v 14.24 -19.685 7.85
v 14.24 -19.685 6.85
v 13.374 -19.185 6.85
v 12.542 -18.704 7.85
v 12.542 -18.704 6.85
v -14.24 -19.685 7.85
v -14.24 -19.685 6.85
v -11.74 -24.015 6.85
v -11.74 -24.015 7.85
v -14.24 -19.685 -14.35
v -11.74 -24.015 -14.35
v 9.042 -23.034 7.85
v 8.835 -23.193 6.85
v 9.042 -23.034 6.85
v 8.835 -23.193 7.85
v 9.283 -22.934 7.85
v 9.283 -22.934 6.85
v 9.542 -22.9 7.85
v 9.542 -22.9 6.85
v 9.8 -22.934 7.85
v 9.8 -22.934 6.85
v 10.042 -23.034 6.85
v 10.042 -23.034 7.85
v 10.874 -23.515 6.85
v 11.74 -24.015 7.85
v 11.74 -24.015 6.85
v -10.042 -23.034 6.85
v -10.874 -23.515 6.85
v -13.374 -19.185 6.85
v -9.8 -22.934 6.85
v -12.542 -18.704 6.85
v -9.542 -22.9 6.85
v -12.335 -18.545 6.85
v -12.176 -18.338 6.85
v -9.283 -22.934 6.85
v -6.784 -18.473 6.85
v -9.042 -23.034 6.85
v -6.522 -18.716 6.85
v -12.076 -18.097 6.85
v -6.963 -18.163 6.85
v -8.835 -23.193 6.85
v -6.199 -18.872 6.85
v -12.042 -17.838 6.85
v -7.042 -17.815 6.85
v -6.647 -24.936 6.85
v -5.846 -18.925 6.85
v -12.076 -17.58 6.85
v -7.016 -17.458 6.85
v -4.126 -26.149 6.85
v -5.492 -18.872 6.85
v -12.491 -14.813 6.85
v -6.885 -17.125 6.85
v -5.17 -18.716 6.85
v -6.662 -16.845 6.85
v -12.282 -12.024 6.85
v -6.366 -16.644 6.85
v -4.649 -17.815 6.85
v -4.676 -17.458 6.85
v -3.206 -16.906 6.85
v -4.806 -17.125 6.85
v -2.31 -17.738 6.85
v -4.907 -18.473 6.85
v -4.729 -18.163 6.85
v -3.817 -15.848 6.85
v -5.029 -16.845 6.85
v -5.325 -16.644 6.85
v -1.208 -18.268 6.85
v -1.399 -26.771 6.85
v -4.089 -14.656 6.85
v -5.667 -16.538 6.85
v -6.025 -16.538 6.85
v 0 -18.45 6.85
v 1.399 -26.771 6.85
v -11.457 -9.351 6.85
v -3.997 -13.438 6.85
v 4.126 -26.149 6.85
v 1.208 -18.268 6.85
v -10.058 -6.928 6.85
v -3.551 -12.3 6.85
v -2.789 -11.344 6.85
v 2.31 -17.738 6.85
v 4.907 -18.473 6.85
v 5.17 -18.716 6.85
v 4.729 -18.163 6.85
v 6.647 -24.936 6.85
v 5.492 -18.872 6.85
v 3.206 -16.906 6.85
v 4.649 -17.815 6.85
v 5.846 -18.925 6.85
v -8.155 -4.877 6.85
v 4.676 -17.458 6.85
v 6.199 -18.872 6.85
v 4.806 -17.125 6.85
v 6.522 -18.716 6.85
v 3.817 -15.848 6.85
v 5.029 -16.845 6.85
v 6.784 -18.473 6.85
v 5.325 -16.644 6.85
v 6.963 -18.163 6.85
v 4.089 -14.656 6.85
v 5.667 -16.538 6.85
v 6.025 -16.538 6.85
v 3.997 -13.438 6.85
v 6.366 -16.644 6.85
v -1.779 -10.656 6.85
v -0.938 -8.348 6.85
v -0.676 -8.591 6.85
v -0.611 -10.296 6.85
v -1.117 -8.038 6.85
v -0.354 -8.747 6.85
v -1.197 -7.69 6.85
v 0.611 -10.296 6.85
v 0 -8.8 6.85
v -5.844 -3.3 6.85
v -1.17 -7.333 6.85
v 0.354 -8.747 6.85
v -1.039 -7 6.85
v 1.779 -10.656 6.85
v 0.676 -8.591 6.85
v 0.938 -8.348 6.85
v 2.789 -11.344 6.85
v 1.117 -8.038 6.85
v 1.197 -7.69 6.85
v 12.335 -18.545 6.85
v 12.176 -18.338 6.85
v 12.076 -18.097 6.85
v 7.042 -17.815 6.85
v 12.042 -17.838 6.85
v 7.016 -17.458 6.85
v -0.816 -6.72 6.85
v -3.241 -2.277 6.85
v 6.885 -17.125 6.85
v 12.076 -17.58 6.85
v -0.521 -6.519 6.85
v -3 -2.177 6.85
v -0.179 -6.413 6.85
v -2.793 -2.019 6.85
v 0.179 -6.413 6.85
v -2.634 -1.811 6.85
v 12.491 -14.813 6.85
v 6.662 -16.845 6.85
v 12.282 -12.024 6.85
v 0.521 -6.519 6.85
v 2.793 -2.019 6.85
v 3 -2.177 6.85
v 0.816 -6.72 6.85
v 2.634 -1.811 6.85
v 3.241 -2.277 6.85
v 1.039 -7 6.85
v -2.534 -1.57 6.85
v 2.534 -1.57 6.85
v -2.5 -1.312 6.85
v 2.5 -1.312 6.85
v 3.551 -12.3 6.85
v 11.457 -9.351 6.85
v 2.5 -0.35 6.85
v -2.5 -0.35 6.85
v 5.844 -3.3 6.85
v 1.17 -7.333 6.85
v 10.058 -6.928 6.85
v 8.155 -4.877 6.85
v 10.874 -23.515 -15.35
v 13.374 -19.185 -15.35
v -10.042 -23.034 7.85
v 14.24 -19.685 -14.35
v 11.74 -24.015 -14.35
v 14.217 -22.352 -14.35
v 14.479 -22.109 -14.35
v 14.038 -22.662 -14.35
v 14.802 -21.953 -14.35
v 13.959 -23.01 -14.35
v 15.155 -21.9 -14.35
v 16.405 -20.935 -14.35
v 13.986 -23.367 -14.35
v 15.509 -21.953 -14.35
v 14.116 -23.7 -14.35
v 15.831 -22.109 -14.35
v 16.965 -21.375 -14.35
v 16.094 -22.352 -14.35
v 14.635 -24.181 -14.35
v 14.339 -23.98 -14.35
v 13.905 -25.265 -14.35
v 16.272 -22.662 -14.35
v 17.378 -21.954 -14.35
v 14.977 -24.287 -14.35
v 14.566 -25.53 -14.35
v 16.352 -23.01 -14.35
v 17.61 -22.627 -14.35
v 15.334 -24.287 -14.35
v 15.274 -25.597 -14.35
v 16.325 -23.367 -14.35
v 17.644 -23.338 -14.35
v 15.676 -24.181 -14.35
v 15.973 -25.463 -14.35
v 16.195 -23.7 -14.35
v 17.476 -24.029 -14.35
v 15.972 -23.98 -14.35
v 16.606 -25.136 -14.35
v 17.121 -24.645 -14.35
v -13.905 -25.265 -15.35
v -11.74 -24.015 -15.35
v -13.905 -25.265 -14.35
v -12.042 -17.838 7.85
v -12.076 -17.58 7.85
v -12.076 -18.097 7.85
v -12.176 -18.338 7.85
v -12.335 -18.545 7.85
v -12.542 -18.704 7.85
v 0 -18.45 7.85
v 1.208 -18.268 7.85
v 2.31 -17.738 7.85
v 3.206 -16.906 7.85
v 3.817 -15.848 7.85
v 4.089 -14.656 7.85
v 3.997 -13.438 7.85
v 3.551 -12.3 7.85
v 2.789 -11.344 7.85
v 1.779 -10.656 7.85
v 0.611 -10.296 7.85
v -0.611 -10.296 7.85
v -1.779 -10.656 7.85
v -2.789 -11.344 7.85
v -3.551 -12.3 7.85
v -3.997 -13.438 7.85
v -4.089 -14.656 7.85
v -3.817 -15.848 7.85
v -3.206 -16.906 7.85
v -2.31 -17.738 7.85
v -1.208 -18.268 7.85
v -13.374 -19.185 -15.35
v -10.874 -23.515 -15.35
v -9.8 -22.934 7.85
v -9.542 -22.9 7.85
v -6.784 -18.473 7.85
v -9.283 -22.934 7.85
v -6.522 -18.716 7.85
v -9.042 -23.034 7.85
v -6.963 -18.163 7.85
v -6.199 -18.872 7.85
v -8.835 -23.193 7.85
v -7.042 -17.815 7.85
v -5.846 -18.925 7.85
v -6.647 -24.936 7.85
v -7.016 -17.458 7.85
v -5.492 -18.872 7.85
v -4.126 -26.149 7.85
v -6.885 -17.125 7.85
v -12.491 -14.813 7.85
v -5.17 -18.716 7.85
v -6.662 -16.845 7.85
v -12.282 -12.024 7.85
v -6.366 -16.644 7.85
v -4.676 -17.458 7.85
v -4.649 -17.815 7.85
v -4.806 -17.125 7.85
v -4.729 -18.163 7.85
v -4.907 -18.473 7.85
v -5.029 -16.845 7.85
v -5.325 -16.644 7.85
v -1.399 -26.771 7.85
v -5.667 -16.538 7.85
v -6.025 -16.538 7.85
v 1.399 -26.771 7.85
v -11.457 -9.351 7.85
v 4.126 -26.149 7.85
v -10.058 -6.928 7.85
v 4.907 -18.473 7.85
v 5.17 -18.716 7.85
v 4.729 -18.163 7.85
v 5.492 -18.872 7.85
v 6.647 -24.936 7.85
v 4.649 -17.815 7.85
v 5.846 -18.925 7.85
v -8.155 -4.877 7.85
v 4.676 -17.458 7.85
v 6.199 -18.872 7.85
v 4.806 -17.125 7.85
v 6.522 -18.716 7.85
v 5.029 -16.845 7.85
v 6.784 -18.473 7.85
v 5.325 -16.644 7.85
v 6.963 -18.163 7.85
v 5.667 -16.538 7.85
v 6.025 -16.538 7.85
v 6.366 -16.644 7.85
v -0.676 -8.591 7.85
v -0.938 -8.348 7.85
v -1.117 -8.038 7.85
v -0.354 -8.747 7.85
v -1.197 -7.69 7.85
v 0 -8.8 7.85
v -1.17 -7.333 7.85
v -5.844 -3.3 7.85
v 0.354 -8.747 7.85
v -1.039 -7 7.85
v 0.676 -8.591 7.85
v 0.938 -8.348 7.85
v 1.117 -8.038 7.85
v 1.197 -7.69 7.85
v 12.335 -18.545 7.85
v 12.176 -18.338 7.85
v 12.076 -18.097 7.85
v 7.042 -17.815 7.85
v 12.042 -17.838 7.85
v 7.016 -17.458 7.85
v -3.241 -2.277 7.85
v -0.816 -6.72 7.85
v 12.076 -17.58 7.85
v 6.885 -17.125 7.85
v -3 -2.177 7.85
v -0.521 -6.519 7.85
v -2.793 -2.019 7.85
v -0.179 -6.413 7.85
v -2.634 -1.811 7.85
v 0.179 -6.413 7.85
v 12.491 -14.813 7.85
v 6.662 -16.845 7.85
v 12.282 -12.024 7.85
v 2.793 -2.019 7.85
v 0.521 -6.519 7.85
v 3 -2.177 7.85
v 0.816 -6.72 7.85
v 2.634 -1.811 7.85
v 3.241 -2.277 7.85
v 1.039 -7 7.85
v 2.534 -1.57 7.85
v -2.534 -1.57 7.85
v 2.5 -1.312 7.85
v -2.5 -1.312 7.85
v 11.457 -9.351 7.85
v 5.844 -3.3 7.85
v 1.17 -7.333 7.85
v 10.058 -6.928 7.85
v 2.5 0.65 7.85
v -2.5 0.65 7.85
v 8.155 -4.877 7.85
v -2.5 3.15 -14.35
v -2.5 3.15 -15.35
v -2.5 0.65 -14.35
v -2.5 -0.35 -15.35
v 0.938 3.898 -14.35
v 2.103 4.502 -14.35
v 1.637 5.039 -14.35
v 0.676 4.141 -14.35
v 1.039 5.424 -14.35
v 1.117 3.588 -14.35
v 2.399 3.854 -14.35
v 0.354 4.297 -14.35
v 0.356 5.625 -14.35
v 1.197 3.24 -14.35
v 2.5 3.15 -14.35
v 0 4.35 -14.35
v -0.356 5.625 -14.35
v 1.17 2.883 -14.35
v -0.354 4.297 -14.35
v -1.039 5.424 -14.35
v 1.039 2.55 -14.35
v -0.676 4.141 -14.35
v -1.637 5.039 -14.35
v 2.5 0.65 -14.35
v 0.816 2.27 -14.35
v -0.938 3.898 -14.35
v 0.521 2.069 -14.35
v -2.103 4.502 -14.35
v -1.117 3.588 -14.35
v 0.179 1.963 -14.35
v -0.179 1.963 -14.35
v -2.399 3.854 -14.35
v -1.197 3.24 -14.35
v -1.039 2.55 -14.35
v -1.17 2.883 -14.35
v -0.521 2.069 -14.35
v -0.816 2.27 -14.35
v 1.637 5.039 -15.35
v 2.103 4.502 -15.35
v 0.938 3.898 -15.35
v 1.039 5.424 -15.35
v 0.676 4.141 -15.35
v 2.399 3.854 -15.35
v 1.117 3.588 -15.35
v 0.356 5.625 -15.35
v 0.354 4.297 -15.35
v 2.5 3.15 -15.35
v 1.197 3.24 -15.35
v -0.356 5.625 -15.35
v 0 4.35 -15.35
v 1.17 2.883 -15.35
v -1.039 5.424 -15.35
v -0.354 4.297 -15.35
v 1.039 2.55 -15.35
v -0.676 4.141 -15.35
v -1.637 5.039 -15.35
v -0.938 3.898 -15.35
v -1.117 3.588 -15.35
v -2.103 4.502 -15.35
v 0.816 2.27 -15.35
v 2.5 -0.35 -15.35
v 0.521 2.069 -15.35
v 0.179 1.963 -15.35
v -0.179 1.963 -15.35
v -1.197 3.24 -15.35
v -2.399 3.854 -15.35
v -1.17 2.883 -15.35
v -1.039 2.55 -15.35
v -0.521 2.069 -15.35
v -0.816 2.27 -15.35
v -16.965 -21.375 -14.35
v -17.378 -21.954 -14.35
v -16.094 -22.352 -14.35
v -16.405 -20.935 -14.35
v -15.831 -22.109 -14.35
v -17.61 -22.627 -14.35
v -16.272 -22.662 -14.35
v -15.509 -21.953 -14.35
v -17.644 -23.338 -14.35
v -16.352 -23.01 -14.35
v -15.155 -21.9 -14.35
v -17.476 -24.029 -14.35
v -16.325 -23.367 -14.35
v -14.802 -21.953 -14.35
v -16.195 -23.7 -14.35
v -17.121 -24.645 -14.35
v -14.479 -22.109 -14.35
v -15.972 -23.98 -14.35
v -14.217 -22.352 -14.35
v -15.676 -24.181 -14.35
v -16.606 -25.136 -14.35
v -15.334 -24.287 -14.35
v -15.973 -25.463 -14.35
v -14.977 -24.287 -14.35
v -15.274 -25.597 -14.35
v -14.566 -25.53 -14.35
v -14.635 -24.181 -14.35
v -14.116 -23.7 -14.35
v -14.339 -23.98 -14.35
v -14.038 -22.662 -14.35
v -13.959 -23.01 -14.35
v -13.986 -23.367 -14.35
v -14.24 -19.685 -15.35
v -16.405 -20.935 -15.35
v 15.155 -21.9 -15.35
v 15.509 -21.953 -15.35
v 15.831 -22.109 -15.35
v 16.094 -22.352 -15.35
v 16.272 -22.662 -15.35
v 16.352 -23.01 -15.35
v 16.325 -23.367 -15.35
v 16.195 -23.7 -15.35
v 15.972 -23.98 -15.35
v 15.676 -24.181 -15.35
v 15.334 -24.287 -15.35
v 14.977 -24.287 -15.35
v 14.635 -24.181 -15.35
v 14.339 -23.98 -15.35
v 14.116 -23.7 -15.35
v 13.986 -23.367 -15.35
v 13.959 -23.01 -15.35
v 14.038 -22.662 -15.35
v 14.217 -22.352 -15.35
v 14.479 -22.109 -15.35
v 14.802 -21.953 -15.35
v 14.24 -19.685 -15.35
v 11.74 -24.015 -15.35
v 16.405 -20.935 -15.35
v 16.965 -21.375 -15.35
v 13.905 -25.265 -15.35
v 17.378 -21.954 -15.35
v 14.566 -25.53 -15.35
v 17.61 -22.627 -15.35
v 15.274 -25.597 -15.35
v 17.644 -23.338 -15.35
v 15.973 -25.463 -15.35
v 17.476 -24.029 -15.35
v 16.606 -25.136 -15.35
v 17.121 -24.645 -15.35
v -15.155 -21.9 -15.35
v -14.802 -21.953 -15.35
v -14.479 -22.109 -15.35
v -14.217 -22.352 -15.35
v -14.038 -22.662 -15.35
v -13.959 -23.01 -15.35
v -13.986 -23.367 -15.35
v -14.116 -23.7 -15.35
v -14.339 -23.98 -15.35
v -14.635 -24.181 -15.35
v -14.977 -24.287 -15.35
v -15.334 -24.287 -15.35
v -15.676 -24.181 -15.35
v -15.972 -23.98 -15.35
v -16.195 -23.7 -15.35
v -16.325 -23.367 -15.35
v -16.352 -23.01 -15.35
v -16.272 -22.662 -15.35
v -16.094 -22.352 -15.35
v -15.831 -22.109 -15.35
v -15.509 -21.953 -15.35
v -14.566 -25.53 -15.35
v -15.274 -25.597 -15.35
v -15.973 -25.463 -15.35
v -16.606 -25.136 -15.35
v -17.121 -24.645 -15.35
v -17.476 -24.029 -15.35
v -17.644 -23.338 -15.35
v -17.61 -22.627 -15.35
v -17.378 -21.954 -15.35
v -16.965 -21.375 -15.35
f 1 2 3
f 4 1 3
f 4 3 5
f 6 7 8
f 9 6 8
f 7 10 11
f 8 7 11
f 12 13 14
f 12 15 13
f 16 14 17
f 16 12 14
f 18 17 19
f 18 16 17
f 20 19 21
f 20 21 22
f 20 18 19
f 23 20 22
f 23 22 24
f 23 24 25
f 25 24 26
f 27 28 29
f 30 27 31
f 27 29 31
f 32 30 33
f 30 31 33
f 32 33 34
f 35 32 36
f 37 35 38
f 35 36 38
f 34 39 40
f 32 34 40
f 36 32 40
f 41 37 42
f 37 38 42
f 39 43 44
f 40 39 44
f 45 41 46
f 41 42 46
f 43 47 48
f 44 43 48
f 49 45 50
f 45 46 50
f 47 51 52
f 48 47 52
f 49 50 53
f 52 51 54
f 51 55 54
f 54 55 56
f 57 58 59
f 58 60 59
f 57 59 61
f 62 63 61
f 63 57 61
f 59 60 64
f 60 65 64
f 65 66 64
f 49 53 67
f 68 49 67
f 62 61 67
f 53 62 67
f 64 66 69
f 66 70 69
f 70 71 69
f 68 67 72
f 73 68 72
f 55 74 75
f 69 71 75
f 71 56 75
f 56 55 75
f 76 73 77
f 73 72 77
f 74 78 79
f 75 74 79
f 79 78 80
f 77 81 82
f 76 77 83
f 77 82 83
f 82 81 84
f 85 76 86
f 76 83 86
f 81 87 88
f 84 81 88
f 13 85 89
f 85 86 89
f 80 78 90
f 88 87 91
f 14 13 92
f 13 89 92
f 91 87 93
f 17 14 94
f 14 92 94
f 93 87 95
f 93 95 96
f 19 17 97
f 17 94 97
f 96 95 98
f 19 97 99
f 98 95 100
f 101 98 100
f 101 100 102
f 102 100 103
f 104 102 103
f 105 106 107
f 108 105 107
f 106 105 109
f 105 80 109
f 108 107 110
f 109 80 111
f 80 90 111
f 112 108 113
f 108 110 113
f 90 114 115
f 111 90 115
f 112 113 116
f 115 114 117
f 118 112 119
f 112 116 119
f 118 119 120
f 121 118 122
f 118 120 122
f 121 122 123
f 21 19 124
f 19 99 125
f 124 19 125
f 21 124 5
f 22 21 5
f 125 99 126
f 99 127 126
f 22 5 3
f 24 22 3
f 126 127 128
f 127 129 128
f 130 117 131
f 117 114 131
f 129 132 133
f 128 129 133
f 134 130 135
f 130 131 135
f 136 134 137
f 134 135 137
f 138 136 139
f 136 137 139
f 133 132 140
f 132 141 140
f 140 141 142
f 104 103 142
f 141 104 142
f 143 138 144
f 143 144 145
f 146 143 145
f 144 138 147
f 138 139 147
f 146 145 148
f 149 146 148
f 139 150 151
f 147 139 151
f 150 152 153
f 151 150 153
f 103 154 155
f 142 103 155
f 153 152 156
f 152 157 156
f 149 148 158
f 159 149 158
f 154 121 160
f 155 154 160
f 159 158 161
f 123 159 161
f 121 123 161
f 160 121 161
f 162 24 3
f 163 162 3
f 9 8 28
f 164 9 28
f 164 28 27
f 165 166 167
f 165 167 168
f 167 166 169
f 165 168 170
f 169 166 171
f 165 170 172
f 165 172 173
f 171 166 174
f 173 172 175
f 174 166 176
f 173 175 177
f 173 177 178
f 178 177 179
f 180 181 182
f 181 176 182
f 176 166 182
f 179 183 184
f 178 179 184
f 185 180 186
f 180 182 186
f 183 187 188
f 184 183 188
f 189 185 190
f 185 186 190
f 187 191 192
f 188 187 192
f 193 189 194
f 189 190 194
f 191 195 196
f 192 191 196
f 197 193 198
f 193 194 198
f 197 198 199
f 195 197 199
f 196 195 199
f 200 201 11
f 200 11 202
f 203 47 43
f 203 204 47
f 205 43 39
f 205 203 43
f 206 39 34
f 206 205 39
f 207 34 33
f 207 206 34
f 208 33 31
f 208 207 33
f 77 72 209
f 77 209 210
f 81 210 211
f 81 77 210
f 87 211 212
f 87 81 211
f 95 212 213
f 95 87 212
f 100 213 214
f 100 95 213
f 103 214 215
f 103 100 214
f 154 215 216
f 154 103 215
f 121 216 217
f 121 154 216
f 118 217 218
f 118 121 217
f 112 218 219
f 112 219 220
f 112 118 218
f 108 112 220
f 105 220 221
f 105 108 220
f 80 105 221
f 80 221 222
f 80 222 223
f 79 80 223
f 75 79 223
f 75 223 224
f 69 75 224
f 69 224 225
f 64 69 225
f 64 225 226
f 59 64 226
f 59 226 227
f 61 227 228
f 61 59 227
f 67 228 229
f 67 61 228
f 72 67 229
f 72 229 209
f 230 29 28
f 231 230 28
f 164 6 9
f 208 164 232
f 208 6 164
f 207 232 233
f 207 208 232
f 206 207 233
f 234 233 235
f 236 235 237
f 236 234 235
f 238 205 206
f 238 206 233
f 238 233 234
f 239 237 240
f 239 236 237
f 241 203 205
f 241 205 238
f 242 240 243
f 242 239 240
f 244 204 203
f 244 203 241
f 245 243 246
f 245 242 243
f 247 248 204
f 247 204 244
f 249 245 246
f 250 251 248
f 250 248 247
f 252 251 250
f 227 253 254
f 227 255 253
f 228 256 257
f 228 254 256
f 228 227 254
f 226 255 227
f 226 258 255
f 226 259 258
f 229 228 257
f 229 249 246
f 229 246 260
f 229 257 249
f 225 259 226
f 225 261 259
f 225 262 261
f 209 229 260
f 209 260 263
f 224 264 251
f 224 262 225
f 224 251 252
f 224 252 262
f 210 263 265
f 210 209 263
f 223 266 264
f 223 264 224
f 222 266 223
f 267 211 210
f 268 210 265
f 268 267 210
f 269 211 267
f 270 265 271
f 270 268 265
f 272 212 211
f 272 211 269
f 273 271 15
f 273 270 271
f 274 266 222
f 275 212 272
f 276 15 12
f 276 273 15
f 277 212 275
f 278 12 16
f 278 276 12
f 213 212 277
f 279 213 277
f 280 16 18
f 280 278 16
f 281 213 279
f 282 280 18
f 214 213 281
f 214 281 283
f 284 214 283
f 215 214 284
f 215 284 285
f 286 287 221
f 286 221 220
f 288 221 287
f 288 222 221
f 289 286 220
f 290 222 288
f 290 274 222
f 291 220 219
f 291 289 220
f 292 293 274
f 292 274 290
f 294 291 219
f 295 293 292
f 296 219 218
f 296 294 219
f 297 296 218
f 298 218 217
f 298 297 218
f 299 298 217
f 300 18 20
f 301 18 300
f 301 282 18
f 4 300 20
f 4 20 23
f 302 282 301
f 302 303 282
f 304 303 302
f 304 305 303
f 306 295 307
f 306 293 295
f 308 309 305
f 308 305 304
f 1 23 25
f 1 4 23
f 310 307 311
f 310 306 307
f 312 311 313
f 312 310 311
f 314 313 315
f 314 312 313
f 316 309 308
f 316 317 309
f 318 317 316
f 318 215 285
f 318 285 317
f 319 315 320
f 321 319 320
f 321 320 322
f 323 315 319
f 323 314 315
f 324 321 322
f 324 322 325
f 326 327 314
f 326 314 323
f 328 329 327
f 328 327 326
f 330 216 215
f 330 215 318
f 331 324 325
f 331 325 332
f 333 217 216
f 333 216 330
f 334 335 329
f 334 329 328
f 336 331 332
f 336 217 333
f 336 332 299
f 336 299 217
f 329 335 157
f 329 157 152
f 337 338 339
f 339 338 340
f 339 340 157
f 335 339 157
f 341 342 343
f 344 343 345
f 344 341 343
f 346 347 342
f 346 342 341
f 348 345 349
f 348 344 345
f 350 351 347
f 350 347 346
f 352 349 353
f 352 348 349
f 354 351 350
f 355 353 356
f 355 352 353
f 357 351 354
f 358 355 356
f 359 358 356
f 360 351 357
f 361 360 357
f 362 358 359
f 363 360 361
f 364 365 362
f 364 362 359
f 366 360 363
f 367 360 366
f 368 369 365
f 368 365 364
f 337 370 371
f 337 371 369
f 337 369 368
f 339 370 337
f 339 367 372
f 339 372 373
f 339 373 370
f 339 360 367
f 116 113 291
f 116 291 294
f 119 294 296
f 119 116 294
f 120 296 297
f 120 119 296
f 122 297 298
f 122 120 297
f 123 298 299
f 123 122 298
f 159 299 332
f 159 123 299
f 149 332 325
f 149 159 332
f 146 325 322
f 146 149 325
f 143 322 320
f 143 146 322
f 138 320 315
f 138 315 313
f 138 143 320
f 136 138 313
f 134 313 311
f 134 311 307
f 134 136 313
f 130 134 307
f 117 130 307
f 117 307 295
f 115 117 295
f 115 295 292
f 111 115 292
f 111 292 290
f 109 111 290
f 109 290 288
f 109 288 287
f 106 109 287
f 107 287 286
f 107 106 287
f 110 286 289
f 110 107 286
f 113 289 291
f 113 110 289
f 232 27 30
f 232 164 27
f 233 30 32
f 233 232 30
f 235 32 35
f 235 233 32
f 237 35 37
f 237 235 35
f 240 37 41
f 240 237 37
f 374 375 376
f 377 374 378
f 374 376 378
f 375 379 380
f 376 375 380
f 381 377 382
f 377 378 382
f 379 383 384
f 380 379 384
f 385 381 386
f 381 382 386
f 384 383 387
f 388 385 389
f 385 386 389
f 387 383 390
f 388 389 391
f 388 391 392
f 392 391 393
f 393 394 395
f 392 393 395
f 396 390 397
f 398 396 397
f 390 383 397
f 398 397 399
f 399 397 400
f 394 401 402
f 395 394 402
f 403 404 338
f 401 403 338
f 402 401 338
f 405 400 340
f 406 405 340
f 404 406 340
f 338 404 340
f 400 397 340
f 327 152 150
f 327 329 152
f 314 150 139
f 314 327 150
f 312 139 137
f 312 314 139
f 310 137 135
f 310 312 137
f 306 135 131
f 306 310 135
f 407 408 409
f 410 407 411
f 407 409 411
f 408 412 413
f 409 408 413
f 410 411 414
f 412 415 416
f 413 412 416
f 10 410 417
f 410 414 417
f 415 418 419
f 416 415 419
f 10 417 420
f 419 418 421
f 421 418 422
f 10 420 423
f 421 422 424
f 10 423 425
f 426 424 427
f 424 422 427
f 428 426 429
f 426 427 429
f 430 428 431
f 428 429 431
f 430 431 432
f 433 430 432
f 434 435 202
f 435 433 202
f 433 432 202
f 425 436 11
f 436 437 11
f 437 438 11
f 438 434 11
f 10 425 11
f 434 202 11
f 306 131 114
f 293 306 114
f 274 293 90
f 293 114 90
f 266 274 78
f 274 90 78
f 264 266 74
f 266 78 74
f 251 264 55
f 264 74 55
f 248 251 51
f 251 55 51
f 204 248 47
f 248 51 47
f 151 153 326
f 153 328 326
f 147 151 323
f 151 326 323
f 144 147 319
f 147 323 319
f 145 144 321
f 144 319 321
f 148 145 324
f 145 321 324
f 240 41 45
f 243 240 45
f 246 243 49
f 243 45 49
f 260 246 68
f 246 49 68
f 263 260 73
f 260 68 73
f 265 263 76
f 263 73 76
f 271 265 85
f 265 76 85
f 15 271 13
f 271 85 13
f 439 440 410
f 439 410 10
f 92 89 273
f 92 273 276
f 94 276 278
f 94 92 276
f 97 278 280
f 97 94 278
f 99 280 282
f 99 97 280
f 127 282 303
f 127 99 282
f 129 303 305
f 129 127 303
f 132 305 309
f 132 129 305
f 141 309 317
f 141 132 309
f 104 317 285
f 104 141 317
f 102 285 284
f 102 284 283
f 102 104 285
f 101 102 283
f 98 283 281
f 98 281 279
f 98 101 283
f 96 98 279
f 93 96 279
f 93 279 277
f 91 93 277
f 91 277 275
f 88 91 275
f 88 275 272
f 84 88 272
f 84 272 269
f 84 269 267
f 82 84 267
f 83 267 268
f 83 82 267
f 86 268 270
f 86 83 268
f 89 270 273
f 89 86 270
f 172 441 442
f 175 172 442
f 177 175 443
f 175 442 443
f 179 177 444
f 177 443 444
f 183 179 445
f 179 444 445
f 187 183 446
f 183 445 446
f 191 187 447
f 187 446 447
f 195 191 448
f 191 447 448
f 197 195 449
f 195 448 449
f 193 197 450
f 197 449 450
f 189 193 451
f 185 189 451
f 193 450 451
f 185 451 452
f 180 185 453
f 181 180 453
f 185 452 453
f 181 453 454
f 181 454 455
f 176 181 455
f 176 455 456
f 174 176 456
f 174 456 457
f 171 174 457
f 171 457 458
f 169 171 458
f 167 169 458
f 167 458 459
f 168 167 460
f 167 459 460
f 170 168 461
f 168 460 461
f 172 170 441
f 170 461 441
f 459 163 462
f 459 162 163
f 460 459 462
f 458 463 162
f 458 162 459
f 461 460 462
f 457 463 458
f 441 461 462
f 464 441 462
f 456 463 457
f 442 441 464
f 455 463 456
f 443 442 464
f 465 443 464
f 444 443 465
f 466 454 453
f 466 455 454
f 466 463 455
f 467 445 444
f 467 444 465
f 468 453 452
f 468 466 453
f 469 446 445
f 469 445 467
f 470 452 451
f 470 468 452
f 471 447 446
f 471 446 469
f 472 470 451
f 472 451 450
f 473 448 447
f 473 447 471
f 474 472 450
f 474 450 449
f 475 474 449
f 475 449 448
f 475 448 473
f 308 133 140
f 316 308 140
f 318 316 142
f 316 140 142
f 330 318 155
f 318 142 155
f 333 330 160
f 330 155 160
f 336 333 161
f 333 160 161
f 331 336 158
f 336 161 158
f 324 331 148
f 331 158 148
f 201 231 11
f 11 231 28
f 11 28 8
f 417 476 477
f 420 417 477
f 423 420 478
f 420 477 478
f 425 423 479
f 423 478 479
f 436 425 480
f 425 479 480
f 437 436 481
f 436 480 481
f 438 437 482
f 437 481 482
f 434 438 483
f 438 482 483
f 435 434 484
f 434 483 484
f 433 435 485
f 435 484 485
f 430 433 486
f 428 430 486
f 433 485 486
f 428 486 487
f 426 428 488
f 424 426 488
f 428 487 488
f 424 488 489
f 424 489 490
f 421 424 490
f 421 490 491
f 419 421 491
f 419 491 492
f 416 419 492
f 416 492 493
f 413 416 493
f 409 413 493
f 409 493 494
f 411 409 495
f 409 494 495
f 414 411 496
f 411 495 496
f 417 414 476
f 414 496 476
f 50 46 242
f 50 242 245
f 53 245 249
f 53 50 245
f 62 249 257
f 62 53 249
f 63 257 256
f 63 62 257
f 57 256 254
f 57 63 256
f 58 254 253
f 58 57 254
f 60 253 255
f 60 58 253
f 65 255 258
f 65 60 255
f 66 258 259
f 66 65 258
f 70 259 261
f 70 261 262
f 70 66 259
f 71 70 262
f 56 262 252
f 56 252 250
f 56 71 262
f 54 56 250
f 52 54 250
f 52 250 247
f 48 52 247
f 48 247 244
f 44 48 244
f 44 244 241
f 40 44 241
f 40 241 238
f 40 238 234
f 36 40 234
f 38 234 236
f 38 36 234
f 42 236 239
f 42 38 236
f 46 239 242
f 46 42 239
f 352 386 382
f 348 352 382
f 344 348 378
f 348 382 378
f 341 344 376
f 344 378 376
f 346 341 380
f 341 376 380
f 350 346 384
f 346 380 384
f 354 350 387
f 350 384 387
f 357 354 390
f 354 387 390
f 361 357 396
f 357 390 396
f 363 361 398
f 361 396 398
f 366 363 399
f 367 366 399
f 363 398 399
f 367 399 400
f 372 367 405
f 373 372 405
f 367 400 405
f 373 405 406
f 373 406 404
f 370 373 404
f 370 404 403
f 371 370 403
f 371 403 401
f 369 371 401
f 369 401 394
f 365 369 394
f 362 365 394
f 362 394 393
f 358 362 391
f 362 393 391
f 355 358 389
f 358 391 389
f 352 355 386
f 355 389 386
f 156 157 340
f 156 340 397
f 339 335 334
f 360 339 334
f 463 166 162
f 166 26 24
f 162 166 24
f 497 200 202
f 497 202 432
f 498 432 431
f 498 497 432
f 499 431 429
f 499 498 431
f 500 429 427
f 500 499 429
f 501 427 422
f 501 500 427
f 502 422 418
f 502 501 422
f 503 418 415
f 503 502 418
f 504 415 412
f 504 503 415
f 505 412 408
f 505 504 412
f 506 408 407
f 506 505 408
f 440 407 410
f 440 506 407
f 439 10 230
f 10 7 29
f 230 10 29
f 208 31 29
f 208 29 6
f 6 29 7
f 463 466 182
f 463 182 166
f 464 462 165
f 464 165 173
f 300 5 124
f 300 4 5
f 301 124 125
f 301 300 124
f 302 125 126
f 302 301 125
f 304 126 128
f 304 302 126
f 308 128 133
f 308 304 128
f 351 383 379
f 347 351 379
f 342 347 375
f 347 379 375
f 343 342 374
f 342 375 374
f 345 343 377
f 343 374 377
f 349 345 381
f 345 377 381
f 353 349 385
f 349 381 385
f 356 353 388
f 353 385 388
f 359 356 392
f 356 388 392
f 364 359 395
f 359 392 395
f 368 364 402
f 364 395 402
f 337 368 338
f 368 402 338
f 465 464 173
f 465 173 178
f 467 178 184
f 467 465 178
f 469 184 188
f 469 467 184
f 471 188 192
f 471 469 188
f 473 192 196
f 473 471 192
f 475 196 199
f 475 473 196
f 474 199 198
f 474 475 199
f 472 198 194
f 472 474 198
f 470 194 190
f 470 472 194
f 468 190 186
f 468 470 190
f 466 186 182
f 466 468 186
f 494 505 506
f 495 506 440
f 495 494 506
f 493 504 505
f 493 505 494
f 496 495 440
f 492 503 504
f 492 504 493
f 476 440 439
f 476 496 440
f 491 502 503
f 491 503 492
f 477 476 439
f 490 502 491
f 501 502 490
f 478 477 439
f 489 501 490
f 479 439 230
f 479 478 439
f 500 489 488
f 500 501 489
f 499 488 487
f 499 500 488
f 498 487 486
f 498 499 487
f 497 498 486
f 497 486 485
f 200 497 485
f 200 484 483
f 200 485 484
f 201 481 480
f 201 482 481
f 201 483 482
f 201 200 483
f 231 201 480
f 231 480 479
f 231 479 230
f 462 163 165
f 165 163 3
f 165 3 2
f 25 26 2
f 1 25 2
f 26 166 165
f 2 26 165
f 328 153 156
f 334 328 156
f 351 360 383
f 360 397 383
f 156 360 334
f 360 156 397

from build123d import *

# Parameters (mm, degrees)
ESBO_O1_R                = 4.1
ESBO_O1_R_2              = 1.2
RESSALTO_EXTRUS_O1_DEPTH = 1
ESBO_O2_W                = 5
ESBO_O2_H                = 1
RESSALTO_EXTRUS_O2_DEPTH = 22.2
ESBO_O3_R                = 1.2
RESSALTO_EXTRUS_O3_DEPTH = 1
FILETE1_R                = 1
BODY_MOVE_COPY2_ANGLE    = 90


with BuildPart() as part:
    # Esboço1 → Ressalto-extrusão1 (new body)
    with BuildSketch(Plane(origin=(0, 0, 0), x_dir=(1, 0, 0), z_dir=(0, 1, 0))):
        with BuildLine():
            Line((-2.5, 15), (-2.5, 12.247448714))
            ThreePointArc((-2.5, 12.247448714), (-10.825317547, 6.25), (-11.856601718, -3.958660847))
            Line((-11.856601718, -3.958660847), (-14.240381057, -5.334936491))
            Line((-14.240381057, -5.334936491), (-11.740381057, -9.665063509))
            Line((-11.740381057, -9.665063509), (-9.356601718, -8.288787866))
            ThreePointArc((-9.356601718, -8.288787866), (0, -12.5), (9.356601718, -8.288787866))
            Line((9.356601718, -8.288787866), (11.740381057, -9.665063509))
            Line((11.740381057, -9.665063509), (14.240381057, -5.334936491))
            Line((14.240381057, -5.334936491), (11.856601718, -3.958660847))
            ThreePointArc((11.856601718, -3.958660847), (10.825317547, 6.25), (2.5, 12.247448714))
            Line((2.5, 12.247448714), (2.5, 15))
            Line((2.5, 15), (-2.5, 15))
        make_face()
        with Locations(Location((0, 0, 0), (0, 0, 270))):
            Circle(ESBO_O1_R, mode=Mode.SUBTRACT)
        with Locations(Location((0, 6.75, 0), (0, 0, 270))):
            Circle(ESBO_O1_R_2, mode=Mode.SUBTRACT)
        with Locations(Location((5.845671476, -3.375, 0), (0, 0, 270))):
            Circle(ESBO_O1_R_2, mode=Mode.SUBTRACT)
        with Locations(Location((-5.845671476, -3.375, 0), (0, 0, 270))):
            Circle(ESBO_O1_R_2, mode=Mode.SUBTRACT)
    extrude(amount=RESSALTO_EXTRUS_O1_DEPTH)

    # Esboço2 → Ressalto-extrusão2 (add)
    with BuildSketch(Plane.XZ):
        with Locations((0, -14.5)):
            Rectangle(ESBO_O2_W, ESBO_O2_H)
        Polygon((-10.874355653, 9.165063509), (-11.740381057, 9.665063509), (-14.240381057, 5.334936491), (-13.374355653, 4.834936491), align=None)
        Polygon((13.374355653, 4.834936491), (14.240381057, 5.334936491), (11.740381057, 9.665063509), (10.874355653, 9.165063509), align=None)
    extrude(amount=RESSALTO_EXTRUS_O2_DEPTH)

    # Esboço3 → Ressalto-extrusão3 (add)
    # profile 1 of 3: a face of its own
    with BuildSketch(Plane.XZ.offset(22.2)):
        with BuildLine():
            Line((2.5, -15), (2.5, -17.5))
            ThreePointArc((2.5, -17.5), (0, -20), (-2.5, -17.5))
            Line((-2.5, -17.5), (-2.5, -15))
            Line((-2.5, -15), (2.5, -15))
        make_face()
        with Locations(Location((0, -17.5, 0), (0, 0, 270))):
            Circle(ESBO_O3_R, mode=Mode.SUBTRACT)
    # profile 2 of 3: a face of its own
    with BuildSketch(Plane.XZ.offset(22.2)):
        with BuildLine():
            Line((-11.740381057, 9.665063509), (-13.905444566, 10.915063509))
            ThreePointArc((-13.905444566, 10.915063509), (-17.320508076, 10), (-16.405444566, 6.584936491))
            Line((-16.405444566, 6.584936491), (-14.240381057, 5.334936491))
            Line((-14.240381057, 5.334936491), (-11.740381057, 9.665063509))
        make_face()
        with Locations(Location((-15.155444566, 8.75, 0), (0, 0, 270))):
            Circle(ESBO_O3_R, mode=Mode.SUBTRACT)
    # profile 3 of 3: a face of its own
    with BuildSketch(Plane.XZ.offset(22.2)):
        with BuildLine():
            Line((14.240381057, 5.334936491), (16.405444566, 6.584936491))
            ThreePointArc((16.405444566, 6.584936491), (17.320508076, 10), (13.905444566, 10.915063509))
            Line((13.905444566, 10.915063509), (11.740381057, 9.665063509))
            Line((11.740381057, 9.665063509), (14.240381057, 5.334936491))
        make_face()
        with Locations(Location((15.155444566, 8.75, 0), (0, 0, 270))):
            Circle(ESBO_O3_R, mode=Mode.SUBTRACT)
    extrude(amount=-RESSALTO_EXTRUS_O3_DEPTH)

    # Filete1
    filete1_edges = [part.edges().sort_by_distance(p)[0] for p in [
        (11.856601718, 0.5, 3.958660847),
        (2.5, 0.5, -12.247448714),
        (-2.5, 0.5, -12.247448714),
        (-11.856601718, 0.5, 3.958660847),
        (9.356601718, 0.5, 8.288787866),
        (-9.356601718, 0.5, 8.288787866),
    ]]
    fillet(filete1_edges, radius=FILETE1_R)


with BuildPart() as part_1:
    # Body-Move/Copy2: moved
    add(part.part.rotate(Axis((0, -10.6, -3.75), (1, 0, 0)), BODY_MOVE_COPY2_ANGLE))


solid = part_1.part
